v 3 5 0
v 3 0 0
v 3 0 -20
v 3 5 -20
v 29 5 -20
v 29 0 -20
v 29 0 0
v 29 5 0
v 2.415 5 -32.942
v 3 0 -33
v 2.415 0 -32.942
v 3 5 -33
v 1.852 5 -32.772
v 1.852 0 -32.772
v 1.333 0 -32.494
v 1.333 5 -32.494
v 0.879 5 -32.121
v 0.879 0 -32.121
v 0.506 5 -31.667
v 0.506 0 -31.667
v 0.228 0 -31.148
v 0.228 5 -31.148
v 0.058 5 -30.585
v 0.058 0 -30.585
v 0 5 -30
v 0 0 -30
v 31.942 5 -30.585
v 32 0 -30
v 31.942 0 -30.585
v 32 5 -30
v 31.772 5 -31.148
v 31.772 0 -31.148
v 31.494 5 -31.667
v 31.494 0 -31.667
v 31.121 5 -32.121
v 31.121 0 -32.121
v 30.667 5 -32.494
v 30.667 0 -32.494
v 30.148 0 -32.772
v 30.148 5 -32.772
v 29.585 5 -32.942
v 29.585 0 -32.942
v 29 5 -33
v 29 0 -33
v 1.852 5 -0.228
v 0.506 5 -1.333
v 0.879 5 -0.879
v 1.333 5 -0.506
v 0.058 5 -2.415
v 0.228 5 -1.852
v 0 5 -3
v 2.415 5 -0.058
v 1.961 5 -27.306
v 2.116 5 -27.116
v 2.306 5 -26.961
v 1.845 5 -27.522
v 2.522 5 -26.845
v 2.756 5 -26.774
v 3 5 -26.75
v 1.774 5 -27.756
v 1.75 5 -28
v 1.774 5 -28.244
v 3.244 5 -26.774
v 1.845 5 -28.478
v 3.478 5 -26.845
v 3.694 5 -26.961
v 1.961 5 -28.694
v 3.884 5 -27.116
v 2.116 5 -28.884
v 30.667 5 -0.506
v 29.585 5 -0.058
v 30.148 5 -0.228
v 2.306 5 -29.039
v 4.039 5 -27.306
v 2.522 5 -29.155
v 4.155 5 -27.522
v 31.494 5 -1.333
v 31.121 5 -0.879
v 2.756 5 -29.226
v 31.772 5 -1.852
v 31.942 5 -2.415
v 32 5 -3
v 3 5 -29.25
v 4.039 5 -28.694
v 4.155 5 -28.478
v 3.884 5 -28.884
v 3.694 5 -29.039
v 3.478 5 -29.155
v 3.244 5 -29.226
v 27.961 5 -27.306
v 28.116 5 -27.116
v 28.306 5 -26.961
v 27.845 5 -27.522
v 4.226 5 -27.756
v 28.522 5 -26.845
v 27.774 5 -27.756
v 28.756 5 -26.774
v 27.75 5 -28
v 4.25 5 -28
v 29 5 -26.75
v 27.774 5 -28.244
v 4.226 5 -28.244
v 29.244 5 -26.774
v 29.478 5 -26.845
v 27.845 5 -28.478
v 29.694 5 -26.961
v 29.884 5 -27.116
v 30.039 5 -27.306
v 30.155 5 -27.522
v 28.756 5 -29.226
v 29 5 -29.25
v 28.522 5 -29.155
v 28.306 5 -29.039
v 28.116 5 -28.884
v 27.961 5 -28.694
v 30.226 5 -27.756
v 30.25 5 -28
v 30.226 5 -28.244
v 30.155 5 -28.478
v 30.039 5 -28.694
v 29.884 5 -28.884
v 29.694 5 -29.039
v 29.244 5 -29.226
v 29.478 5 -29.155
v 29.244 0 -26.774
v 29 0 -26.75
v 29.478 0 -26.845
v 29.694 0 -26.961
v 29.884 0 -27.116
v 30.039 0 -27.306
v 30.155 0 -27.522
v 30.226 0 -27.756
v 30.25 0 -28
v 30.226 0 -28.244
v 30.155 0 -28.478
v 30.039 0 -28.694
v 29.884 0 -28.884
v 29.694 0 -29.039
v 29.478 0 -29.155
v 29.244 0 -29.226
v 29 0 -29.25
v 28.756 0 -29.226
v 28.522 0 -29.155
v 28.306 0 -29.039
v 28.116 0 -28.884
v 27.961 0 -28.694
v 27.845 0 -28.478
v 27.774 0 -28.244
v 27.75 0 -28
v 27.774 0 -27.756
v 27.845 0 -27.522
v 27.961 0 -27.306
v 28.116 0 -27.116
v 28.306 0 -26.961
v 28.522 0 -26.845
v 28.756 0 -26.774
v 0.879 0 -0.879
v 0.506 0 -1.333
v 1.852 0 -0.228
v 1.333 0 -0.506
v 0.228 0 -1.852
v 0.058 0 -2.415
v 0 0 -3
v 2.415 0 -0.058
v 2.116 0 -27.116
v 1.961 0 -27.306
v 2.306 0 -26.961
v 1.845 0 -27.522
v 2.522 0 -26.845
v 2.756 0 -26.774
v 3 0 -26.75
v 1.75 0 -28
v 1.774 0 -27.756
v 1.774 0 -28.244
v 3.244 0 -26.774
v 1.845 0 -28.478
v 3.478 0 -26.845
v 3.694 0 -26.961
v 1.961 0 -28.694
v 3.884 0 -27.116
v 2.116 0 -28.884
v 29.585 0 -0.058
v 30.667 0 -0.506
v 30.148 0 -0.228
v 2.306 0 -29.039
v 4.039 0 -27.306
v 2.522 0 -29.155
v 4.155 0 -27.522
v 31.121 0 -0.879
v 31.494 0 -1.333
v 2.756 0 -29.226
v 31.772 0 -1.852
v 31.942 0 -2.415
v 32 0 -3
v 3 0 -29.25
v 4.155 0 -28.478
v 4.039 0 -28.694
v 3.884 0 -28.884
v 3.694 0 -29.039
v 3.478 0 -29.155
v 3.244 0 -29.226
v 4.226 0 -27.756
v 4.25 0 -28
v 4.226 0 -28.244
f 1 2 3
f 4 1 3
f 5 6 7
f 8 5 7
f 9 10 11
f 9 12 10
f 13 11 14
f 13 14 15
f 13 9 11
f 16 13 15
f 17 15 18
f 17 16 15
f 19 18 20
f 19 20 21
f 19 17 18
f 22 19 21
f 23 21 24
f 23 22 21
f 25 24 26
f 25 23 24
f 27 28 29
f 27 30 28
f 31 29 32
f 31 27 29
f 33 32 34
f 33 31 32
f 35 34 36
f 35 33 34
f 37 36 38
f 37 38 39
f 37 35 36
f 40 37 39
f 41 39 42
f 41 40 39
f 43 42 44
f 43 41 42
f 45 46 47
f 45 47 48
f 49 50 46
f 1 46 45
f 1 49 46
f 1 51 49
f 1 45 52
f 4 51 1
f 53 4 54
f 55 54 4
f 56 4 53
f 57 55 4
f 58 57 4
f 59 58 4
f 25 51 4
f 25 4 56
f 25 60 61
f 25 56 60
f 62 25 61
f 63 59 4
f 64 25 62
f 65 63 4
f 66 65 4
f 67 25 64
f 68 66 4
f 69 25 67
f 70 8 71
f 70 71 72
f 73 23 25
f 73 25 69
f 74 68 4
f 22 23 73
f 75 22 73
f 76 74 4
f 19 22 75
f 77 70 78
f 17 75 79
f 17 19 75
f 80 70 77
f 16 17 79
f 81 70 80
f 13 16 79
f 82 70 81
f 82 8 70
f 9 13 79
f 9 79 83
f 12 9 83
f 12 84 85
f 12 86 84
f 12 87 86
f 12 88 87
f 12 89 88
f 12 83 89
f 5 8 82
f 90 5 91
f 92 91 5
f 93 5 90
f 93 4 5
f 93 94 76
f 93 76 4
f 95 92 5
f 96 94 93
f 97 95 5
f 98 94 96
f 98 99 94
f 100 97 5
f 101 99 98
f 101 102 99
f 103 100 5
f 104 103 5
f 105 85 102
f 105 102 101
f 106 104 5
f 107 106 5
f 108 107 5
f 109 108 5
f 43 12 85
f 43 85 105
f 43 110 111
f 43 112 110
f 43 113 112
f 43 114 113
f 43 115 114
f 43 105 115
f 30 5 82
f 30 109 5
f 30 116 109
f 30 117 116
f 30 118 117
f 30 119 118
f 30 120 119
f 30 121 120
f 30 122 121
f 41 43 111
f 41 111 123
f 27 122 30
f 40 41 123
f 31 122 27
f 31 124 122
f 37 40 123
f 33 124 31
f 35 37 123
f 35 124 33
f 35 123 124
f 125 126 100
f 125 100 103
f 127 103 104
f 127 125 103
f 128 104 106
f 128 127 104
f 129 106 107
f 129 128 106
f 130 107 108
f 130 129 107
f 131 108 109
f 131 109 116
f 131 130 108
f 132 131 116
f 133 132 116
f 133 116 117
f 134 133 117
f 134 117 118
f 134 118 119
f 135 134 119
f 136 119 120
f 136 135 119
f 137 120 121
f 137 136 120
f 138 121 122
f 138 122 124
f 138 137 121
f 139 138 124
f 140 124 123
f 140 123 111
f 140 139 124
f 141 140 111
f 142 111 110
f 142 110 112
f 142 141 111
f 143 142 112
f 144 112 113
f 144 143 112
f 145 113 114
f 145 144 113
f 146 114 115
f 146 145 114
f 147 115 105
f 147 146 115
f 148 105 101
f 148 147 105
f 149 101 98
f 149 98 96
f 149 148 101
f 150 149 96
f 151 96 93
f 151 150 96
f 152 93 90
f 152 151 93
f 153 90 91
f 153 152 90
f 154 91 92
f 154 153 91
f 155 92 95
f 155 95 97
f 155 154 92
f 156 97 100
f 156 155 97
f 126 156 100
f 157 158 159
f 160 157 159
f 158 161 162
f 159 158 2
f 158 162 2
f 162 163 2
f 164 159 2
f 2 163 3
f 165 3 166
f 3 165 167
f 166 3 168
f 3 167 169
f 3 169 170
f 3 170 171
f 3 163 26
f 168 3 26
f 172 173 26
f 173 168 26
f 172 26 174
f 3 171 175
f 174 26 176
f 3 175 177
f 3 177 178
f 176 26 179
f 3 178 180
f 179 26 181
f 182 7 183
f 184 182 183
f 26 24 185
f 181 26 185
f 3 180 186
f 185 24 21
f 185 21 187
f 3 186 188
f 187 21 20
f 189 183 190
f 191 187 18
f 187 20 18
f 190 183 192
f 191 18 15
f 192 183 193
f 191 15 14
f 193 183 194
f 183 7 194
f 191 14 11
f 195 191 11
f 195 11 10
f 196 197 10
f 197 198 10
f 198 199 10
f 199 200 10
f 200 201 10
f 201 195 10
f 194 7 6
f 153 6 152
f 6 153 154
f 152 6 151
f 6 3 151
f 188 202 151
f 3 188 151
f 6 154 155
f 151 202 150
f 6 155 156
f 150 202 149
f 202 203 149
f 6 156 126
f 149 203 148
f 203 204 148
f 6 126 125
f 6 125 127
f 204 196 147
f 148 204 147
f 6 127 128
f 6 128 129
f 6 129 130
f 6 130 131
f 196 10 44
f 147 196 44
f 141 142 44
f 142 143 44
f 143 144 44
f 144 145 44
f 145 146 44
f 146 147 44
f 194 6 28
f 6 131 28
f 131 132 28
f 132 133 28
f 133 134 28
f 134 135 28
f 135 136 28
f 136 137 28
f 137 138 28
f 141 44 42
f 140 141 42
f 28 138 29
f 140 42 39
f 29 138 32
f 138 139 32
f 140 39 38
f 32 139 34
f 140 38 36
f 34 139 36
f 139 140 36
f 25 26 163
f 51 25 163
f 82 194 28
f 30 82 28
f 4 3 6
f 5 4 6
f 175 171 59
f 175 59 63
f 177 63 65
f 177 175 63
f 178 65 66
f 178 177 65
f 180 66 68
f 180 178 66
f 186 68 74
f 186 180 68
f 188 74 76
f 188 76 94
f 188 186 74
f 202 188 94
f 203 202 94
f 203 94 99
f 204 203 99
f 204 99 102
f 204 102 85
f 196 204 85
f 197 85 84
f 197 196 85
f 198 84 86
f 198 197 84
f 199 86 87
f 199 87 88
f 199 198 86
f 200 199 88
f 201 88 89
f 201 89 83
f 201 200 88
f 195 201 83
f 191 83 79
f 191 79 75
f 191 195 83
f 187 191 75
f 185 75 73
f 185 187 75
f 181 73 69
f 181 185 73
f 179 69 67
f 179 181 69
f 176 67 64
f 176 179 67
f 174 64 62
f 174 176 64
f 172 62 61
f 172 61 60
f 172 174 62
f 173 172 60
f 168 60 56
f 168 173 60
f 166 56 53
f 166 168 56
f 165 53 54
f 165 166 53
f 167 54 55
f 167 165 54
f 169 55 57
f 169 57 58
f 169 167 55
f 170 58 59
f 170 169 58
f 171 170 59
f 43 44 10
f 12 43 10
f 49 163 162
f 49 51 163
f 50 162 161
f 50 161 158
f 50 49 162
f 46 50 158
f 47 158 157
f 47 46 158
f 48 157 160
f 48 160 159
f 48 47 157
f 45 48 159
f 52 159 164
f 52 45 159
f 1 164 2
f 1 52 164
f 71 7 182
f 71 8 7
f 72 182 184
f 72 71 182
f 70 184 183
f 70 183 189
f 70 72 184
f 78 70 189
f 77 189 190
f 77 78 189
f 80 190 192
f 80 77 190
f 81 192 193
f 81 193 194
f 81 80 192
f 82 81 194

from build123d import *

# Parameters (mm, degrees)
SKETCH1_R           = 1.25
BOSS_EXTRUDE1_DEPTH = 5
FILLET1_R           = 3


with BuildPart() as part:
    # Sketch1 → Boss-Extrude1 (new body)
    with BuildSketch(Plane(origin=(0, 0, 0), x_dir=(1, 0, 0), z_dir=(0, 1, 0))):
        Polygon((29, 0), (32, 0), (32, 33), (0, 33), (0, 0), (3, 0), (3, 20), (29, 20), align=None)
        with Locations(Location((3, 28, 0), (0, 0, 270))):
            Circle(SKETCH1_R, mode=Mode.SUBTRACT)
        with Locations(Location((29, 28, 0), (0, 0, 270))):
            Circle(SKETCH1_R, mode=Mode.SUBTRACT)
    extrude(amount=BOSS_EXTRUDE1_DEPTH)

    # Fillet1
    fillet1_edges = [part.edges().sort_by_distance(p)[0] for p in [
        (0, 2.5, -33),
        (32, 2.5, -33),
        (32, 2.5, 0),
        (0, 2.5, 0),
    ]]
    fillet(fillet1_edges, radius=FILLET1_R - 0.0001)  # a hair under: the kernel refuses the full size


solid = part.part
